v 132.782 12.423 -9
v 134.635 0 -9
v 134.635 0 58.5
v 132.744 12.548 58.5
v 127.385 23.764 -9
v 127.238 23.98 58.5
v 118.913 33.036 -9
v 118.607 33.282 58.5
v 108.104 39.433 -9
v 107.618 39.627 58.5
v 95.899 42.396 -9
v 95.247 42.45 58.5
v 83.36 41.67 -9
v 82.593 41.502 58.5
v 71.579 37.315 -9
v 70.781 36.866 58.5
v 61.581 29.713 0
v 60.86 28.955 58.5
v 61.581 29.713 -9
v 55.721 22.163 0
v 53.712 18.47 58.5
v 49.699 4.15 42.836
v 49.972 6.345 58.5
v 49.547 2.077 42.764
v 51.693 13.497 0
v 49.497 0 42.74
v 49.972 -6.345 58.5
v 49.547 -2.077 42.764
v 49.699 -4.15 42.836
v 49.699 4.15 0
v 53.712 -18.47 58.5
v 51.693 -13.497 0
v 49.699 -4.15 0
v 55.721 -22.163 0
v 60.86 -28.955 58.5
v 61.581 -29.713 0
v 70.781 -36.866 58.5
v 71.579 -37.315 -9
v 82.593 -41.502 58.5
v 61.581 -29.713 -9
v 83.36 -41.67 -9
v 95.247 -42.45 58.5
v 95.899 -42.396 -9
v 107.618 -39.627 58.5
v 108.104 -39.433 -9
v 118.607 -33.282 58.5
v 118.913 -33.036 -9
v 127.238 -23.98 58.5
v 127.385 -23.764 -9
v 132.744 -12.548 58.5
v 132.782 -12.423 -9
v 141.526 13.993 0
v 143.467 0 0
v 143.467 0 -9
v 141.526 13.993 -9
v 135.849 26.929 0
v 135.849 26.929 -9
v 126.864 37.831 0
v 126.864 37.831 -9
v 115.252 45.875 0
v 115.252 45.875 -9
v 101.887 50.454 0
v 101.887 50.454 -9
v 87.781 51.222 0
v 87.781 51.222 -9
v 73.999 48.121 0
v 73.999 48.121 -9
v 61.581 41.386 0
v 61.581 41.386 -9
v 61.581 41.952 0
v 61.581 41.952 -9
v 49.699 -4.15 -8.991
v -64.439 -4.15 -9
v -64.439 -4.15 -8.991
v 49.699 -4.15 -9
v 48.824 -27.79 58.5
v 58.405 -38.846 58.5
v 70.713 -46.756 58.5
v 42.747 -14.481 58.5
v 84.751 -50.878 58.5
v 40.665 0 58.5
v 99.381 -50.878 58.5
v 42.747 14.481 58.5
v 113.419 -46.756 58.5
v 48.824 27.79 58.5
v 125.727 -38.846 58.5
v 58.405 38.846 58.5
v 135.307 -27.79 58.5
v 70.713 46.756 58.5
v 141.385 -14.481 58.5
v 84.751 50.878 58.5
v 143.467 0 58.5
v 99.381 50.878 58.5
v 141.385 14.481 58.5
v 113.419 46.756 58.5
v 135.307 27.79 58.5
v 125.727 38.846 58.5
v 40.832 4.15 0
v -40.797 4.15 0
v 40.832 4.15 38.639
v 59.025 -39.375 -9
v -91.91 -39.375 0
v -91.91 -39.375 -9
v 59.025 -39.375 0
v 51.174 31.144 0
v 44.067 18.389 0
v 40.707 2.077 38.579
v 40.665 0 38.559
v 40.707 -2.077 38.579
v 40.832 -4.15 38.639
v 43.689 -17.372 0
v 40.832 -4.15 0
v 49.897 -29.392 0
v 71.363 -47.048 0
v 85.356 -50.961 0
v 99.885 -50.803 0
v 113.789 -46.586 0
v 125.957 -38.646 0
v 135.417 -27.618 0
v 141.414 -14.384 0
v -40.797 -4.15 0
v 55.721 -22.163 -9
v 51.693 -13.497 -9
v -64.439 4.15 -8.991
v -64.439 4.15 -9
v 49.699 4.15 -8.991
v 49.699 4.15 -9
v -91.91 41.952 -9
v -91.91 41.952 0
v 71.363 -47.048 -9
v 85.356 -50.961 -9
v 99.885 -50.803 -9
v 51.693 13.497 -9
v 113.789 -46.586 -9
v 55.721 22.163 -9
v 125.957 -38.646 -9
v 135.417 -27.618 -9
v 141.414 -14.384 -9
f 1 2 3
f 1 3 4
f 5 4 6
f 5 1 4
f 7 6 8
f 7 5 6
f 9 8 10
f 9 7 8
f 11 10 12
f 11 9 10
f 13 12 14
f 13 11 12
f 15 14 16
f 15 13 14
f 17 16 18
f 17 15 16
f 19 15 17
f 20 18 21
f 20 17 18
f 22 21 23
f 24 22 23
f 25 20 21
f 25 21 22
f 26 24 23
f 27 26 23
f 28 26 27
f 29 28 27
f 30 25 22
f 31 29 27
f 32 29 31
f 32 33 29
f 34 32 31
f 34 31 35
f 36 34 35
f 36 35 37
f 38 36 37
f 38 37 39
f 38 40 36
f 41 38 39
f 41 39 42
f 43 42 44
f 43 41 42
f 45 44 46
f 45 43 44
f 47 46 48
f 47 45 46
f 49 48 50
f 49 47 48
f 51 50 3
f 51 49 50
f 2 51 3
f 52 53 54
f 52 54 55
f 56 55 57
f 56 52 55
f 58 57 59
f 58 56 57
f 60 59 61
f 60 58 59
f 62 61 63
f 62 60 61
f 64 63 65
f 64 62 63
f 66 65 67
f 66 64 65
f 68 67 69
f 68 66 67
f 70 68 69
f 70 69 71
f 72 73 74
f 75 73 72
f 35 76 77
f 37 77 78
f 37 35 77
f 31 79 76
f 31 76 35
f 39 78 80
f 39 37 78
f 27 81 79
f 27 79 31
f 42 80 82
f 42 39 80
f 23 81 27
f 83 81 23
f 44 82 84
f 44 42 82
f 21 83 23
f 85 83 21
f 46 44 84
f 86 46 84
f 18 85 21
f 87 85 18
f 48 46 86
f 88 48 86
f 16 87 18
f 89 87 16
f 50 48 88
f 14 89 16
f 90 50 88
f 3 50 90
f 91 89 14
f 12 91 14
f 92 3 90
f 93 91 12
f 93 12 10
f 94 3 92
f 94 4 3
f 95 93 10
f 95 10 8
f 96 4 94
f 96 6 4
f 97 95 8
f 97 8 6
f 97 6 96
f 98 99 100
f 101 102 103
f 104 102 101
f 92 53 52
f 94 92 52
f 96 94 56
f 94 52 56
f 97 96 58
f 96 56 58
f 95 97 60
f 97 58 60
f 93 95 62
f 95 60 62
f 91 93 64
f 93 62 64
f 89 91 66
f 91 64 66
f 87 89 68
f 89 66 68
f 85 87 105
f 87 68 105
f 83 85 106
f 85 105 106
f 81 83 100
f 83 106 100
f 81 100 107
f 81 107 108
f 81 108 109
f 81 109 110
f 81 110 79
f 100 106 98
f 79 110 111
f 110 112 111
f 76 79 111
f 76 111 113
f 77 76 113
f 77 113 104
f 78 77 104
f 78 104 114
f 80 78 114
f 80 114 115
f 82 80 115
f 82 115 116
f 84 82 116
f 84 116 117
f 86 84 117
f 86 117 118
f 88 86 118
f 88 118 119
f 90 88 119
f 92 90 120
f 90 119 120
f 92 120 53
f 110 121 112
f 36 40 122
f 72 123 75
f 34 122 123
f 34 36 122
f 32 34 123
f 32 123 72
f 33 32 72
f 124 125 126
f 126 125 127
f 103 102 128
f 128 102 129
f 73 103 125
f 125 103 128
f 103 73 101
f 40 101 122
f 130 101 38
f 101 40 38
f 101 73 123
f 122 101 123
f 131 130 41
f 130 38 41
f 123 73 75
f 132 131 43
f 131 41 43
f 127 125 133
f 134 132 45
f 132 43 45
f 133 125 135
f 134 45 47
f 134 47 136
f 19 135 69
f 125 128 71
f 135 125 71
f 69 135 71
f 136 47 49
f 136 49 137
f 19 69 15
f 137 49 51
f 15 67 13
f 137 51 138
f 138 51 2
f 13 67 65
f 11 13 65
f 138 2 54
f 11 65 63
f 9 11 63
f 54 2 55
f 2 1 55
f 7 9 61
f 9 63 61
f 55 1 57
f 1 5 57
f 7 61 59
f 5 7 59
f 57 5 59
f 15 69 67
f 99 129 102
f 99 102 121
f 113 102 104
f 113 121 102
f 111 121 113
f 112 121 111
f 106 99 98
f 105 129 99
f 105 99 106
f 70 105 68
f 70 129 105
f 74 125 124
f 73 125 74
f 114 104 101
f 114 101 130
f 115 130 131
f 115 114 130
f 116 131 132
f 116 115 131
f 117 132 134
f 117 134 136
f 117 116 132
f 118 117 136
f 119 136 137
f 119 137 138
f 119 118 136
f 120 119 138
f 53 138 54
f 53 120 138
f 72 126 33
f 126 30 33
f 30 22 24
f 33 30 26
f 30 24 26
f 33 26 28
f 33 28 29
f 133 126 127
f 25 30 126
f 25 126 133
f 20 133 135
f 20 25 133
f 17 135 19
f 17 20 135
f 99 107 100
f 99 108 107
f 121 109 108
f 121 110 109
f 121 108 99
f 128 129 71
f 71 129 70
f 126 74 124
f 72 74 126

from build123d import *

# Parameters (mm, degrees)
F1_R     = 51.4012769419
F1_R_2   = 42.5693345022
F2_DEPTH = 9
F3_DEPTH = 58.5
F4_DEPTH = 4.15
F5_W     = 153.4909196198
F5_H     = 81.327278167
F6_DEPTH = 9
F7_DEPTH = 81.9
F8_DEPTH = 2.2


with BuildPart() as f2:
    # F1 (on Top) → F2 (new body)
    with BuildSketch(Plane.XY):
        with Locations((92.0659080148, 0)):
            Circle(F1_R)
        with Locations((92.0659080148, 0)):
            Circle(F1_R_2, mode=Mode.SUBTRACT)
    extrude(amount=-F2_DEPTH)

    # F1 (on Top) → F3 (join)
    with BuildSketch(Plane.XY):
        with Locations((92.0659080148, 0)):
            Circle(F1_R)
        with Locations((92.0659080148, 0)):
            Circle(F1_R_2, mode=Mode.SUBTRACT)
    extrude(amount=F3_DEPTH)

    # F0 (on Front) → F4 (join, symmetric)
    with BuildSketch(Plane.XZ):
        Polygon((55.6977316737, 45.6750020385), (-64.4393563271, -11.1907897517), (55.6977316737, -11.1907897517), align=None)
    extrude(amount=F4_DEPTH, both=True)

    # F5 (on Top) → F6 (join)
    with BuildSketch(Plane.XY):
        with Locations((-15.1641424745, 1.2886393815)):
            Rectangle(F5_W, F5_H)
    extrude(amount=-F6_DEPTH)

    # F7 (cut): faces of the model
    f7_faces = [f2.faces().sort_by_distance(p)[0] for p in [
        (57.1486967717, 0, 0),
        (52.6306177028, 0, 44.2232116932),
    ]]
    extrude(f7_faces, amount=-F7_DEPTH, dir=(0, 0, 1), mode=Mode.SUBTRACT)

    # F8 (cut): a face of the model
    f8_faces = [f2.faces().sort_by_distance(p)[0] for p in [
        (-7.4376125562, 1e-10, -11.1907897517),
    ]]
    extrude(f8_faces, amount=-F8_DEPTH, mode=Mode.SUBTRACT)


solid = f2.part
